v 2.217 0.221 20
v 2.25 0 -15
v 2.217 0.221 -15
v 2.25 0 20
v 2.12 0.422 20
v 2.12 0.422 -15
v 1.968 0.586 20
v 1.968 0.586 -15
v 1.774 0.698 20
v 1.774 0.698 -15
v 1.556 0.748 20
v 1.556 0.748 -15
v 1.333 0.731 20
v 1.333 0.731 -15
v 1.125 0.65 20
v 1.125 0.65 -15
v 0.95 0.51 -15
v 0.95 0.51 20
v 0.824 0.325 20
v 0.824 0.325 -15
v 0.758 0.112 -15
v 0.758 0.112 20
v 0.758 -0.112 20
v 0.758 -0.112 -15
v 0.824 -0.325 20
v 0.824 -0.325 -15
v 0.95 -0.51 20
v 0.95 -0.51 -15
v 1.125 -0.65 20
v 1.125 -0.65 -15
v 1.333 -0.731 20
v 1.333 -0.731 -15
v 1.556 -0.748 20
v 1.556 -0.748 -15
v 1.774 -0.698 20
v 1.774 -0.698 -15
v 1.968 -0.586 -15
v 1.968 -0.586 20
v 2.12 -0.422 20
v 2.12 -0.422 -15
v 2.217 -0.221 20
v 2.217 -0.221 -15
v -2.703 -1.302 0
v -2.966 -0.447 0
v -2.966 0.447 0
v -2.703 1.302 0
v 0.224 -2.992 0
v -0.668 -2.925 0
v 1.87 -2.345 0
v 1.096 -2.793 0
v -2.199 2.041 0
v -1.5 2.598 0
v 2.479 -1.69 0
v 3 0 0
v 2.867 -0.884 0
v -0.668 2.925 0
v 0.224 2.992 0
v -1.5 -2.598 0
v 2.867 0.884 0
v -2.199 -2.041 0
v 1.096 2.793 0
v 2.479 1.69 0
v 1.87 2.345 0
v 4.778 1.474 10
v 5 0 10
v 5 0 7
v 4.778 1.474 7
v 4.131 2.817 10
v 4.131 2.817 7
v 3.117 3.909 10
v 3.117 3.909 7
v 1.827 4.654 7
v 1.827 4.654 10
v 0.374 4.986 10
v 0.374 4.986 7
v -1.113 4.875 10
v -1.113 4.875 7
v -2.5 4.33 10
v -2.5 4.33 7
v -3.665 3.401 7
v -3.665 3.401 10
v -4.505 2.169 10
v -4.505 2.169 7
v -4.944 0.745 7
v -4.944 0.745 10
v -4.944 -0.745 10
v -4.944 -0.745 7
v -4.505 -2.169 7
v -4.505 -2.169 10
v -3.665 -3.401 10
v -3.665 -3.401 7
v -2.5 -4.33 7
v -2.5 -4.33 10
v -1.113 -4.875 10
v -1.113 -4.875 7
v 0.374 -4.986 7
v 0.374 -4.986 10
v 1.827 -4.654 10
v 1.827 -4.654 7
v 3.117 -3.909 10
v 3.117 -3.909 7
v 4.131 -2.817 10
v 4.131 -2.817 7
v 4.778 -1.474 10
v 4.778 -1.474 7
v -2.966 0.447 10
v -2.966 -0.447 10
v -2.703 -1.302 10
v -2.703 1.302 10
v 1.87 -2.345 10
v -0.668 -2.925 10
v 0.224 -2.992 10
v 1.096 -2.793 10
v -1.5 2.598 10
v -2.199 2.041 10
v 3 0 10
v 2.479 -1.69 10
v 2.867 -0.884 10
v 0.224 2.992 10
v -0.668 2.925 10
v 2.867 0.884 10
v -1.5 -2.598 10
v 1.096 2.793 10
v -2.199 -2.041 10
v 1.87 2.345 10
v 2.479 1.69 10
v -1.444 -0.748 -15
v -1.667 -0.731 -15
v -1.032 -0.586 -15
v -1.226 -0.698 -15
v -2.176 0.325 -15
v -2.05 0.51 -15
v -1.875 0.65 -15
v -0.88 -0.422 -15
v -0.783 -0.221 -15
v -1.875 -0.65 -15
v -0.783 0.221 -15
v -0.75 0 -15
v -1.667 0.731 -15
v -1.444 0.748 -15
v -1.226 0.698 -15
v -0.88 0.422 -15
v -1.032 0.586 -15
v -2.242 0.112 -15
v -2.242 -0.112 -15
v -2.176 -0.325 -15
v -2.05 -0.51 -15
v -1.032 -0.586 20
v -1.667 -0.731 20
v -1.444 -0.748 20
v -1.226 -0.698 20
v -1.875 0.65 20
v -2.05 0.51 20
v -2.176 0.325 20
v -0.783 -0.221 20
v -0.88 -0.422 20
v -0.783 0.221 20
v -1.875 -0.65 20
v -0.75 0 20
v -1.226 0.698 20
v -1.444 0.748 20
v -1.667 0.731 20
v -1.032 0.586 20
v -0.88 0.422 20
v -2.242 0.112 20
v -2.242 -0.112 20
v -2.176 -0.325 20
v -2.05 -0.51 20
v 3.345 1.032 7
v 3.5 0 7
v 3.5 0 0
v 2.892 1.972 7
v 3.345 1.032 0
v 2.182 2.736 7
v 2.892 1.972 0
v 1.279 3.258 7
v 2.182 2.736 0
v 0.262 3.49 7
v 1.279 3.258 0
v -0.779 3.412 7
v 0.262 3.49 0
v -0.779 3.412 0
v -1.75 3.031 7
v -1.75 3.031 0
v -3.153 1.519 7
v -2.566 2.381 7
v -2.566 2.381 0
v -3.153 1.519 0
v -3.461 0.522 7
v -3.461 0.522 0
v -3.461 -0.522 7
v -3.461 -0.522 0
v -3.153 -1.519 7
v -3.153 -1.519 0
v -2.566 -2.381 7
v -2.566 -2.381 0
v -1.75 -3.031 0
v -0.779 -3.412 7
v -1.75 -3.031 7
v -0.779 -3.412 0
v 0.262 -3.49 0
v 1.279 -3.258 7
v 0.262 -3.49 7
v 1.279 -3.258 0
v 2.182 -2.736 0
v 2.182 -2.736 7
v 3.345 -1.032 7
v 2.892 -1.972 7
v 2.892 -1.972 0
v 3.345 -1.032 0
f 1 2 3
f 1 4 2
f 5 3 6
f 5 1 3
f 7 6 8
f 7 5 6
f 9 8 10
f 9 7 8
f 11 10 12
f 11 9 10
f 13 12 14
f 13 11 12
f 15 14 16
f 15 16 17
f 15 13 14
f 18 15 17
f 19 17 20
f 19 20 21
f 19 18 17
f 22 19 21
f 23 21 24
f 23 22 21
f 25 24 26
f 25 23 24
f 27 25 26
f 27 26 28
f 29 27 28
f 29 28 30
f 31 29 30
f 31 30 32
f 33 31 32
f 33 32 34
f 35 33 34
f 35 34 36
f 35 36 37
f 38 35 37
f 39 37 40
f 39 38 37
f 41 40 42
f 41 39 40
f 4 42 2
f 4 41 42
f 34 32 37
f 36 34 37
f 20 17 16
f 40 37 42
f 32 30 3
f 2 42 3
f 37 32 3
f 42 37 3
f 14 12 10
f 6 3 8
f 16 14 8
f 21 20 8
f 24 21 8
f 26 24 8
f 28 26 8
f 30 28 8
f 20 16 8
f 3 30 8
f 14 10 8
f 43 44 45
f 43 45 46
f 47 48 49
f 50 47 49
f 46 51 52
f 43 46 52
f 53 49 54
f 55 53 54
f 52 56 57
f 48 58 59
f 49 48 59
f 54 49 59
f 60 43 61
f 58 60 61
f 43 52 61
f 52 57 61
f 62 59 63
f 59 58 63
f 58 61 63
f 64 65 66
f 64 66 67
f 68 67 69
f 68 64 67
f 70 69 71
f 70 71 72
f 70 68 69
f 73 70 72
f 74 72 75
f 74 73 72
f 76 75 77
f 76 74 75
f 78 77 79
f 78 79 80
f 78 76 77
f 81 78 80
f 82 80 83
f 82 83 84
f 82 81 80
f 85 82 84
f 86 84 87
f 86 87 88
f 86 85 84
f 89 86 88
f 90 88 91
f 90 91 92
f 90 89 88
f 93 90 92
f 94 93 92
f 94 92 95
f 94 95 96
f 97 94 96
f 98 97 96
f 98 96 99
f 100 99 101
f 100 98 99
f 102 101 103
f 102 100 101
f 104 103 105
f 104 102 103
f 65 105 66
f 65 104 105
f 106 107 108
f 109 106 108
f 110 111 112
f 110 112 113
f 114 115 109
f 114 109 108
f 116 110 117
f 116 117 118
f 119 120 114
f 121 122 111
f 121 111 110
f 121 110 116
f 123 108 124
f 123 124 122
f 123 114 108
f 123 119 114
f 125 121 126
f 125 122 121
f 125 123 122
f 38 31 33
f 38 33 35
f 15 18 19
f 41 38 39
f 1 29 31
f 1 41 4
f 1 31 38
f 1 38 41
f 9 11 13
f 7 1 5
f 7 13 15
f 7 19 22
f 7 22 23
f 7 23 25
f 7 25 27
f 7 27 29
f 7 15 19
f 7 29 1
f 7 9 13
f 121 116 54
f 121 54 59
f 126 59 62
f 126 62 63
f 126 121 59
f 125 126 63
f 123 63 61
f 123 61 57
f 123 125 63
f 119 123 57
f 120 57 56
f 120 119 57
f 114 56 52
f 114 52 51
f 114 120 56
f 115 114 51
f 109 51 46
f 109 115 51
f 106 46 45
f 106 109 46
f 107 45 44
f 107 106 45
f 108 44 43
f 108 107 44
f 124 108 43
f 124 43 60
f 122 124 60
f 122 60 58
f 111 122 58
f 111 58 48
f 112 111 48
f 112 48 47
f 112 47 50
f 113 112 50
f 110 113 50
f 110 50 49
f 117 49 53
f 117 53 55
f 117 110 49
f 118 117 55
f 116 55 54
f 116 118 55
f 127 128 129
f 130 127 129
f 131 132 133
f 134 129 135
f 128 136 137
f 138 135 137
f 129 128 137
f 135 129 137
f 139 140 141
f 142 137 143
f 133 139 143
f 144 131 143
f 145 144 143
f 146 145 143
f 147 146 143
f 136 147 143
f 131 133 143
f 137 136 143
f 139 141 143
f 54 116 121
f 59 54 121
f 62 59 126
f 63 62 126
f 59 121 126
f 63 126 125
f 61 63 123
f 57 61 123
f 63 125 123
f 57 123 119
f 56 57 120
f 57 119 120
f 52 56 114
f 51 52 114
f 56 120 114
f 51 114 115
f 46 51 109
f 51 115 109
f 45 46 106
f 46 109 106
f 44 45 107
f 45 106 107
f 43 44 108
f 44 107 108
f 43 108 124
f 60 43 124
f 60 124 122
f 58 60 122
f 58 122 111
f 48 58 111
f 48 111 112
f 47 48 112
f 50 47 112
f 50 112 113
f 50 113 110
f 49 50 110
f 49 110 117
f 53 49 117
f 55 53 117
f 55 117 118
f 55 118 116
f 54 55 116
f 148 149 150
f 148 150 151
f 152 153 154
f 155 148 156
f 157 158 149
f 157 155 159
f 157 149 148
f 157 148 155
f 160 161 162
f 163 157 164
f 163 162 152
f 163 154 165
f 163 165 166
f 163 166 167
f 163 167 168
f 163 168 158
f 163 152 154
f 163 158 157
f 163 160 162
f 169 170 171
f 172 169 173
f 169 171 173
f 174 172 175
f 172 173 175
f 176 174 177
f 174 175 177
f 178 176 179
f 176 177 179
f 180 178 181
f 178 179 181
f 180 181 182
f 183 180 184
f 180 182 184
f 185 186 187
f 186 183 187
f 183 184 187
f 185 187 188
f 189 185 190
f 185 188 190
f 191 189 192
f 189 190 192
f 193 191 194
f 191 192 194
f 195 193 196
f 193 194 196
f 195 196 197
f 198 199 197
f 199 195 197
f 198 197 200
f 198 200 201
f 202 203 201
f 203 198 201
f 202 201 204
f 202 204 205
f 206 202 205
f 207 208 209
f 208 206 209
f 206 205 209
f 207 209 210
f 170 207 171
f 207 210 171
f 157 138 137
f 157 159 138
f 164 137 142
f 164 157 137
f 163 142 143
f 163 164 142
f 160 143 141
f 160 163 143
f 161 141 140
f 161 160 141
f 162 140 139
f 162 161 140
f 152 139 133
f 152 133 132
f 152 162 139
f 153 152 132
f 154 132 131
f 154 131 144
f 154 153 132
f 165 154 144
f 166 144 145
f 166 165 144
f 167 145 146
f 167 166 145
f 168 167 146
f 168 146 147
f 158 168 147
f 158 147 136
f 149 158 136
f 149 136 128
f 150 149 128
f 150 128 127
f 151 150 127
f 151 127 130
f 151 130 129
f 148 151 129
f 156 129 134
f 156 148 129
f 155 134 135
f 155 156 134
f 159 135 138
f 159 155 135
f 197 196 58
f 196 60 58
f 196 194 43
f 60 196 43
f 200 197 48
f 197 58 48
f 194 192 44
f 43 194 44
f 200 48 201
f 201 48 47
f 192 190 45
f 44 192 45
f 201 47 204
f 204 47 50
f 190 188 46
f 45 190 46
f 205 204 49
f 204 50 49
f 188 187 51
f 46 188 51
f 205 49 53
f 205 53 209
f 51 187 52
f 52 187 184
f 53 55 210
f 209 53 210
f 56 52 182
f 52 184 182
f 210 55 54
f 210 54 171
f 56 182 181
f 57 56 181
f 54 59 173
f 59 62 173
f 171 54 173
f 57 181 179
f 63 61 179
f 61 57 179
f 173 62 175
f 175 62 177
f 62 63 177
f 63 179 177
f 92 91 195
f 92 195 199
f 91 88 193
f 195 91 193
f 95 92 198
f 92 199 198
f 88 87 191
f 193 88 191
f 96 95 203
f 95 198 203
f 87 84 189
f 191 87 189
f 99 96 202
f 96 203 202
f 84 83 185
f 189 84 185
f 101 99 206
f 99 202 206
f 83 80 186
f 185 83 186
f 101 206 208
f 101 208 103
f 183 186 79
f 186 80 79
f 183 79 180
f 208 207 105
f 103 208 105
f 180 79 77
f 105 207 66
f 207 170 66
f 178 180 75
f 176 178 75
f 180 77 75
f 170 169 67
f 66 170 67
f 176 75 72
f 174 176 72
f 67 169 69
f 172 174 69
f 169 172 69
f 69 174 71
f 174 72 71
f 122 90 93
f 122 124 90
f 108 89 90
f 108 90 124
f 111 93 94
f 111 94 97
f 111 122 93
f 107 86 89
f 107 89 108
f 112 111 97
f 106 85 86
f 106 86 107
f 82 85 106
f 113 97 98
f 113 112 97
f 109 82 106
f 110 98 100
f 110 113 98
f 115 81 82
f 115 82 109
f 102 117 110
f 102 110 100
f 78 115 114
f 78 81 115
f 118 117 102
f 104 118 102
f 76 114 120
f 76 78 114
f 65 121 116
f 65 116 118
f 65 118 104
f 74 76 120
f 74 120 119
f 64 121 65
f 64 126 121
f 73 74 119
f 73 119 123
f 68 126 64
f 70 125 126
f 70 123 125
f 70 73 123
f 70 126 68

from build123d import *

# Parameters (mm, degrees)
F0_R          = 3.5
F1_DEPTH      = 10
F2_R          = 5
F3_DEPTH      = 3
F4_R          = 3
F5_DEPTH      = 25
F6_DEPTH      = 10
F7_R          = 0.75
F8_DEPTH      = 10
F8_DEPTH_BACK = 25


with BuildPart() as f1:
    # F0 (on Top) → F1 (new body)
    with BuildSketch(Plane.XY):
        Circle(F0_R)
    extrude(amount=F1_DEPTH)

    # F2 (on face) → F3 (join)
    with BuildSketch(Plane.XY.offset(10)):
        Circle(F2_R)
    extrude(amount=-F3_DEPTH)

    # F4 (on face) → F5 (cut)
    with BuildSketch(Plane.XY.offset(10)):
        Circle(F4_R)
    extrude(amount=-F5_DEPTH, mode=Mode.SUBTRACT)


with BuildPart() as f6:
    # F4 (on face) → F6 (new body)
    with BuildSketch(Plane.XY.offset(10)):
        Circle(F4_R)
    extrude(amount=-F6_DEPTH)


with BuildPart() as f8:
    # F7 (on face) → F8 (new body, two sides)
    with BuildSketch(Plane.XY.offset(10)) as f8_sk:
        with Locations((-1.5, 0)):
            Circle(F7_R)
        with Locations((1.5, 0)):
            Circle(F7_R)
    extrude(amount=F8_DEPTH)
    extrude(f8_sk.sketch, amount=-F8_DEPTH_BACK)


solid = Compound([f1.part, f6.part, f8.part])
